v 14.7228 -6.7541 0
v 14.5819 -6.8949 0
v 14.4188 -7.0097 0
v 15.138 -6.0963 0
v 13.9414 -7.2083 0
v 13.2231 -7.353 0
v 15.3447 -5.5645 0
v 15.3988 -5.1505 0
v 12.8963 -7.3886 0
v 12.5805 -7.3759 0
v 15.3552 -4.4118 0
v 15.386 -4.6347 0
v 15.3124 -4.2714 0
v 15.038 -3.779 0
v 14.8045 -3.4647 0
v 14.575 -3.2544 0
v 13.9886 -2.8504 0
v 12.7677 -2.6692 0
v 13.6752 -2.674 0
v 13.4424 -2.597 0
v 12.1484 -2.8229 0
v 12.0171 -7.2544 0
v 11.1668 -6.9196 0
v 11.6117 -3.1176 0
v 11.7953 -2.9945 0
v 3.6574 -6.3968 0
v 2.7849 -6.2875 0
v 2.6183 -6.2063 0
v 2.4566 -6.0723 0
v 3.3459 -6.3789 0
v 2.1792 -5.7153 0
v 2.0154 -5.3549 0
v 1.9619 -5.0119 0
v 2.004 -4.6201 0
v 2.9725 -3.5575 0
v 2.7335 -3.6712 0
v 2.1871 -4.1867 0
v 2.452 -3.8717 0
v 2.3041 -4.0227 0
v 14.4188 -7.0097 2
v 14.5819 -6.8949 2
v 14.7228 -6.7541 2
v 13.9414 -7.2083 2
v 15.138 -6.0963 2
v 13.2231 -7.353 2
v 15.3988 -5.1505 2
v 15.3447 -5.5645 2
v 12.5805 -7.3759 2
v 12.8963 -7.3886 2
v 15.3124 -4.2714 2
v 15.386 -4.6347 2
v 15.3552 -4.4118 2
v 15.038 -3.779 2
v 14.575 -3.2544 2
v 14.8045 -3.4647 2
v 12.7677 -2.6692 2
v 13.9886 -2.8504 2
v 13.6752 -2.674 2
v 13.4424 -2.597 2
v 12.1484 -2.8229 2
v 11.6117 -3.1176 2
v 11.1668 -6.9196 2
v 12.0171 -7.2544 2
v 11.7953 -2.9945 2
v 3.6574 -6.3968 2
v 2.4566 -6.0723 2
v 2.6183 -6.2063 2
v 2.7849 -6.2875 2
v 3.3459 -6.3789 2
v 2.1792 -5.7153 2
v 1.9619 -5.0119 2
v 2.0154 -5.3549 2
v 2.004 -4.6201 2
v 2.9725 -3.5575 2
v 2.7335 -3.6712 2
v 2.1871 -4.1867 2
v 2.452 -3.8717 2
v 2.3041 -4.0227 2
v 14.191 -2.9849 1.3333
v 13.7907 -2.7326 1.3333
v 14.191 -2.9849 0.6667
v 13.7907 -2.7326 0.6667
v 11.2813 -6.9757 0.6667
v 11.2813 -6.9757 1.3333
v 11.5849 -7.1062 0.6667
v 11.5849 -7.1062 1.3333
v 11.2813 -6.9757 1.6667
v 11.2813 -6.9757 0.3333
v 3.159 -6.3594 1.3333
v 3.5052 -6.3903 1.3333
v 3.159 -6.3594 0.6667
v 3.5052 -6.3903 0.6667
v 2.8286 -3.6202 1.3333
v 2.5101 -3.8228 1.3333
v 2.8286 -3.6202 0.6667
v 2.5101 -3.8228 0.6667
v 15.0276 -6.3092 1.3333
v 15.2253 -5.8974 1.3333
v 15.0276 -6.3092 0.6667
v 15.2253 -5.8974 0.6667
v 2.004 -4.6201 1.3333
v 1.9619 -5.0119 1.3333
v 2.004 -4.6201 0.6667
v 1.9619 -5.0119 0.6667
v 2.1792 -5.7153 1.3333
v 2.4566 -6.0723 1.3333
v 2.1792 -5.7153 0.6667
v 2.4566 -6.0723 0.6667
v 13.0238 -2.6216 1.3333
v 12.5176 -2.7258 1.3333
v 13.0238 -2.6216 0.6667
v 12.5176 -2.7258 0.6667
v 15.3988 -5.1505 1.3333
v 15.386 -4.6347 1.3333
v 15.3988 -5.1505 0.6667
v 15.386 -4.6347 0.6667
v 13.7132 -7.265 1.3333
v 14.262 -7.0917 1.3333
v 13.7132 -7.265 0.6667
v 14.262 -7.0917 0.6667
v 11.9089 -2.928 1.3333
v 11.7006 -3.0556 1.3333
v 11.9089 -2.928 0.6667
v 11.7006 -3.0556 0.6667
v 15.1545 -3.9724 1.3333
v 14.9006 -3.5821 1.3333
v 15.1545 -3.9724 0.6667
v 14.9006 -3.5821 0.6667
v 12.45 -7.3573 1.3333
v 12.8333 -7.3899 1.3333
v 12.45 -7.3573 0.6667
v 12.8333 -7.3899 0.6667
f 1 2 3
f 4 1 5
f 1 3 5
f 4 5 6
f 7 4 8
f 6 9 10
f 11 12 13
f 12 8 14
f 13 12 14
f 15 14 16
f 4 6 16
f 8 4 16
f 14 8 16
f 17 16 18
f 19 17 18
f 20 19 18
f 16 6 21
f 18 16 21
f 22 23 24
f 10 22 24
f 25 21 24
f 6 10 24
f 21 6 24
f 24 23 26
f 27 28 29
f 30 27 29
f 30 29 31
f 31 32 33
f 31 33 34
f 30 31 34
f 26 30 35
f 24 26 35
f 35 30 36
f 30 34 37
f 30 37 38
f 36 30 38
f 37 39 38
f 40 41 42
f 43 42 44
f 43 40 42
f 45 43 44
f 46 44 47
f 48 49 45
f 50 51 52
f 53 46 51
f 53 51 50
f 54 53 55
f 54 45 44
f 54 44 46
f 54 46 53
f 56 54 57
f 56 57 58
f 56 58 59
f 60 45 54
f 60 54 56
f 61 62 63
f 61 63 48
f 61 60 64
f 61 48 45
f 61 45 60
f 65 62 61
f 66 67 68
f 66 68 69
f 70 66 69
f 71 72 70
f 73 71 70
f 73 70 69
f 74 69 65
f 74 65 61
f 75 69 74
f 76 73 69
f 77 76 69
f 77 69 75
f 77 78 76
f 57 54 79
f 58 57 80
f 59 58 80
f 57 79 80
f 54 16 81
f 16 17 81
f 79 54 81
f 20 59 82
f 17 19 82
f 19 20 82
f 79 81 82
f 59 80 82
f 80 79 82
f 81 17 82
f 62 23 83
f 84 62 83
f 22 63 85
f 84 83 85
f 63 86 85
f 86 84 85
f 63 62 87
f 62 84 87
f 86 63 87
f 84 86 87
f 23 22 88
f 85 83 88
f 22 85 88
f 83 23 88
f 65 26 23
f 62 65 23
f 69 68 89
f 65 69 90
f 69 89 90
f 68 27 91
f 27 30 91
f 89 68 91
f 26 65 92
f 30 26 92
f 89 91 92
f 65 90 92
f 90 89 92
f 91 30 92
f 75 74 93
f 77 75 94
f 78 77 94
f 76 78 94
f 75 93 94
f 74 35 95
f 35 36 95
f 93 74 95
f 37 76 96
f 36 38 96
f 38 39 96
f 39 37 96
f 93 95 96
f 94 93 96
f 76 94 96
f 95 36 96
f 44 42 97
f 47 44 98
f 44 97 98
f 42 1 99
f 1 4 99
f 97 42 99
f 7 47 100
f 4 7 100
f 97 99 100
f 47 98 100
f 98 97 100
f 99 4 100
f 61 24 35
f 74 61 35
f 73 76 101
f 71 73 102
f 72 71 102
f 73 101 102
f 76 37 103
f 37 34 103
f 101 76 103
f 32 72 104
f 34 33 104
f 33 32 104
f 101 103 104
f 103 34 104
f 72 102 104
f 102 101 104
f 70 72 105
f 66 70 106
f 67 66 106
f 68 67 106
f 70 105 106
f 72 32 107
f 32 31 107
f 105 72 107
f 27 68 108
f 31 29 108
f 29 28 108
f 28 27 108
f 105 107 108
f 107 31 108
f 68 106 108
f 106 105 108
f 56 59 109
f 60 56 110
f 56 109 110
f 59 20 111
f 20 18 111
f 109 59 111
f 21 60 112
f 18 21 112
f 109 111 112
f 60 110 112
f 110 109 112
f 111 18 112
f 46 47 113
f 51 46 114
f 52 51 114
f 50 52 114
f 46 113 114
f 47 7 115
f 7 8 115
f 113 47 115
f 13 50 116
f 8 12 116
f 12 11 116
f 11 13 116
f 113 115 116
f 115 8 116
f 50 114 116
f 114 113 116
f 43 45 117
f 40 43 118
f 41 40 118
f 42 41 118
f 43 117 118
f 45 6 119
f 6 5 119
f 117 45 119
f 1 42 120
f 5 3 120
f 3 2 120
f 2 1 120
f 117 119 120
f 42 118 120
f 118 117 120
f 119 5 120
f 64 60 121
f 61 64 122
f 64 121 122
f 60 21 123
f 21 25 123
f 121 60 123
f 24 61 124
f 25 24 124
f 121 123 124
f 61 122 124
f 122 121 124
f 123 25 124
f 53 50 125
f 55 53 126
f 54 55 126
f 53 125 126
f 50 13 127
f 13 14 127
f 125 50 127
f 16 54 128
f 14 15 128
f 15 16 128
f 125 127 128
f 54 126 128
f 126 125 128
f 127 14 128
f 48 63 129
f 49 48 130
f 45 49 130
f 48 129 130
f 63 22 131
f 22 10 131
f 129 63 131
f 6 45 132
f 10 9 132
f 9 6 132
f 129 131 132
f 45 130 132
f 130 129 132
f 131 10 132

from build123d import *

# Parameters (mm, degrees)
EXTRUDE_DEPTH = 2


with BuildPart() as part:
    # path2399 → Extrude (new body)
    with BuildSketch(Plane(origin=(8.682374, -4.98127, 0), x_dir=(0, 1, 0), z_dir=(0, 0, 1))):
        with BuildLine():
            add(Edge.make_bspline(
                [(-1.415579, 5.024931), (-1.938341, -2.484397)],
                knots=[0, 0, 7.527502, 7.527502], degree=1))
            add(Edge.make_bspline(
                [(-1.938341, -2.484397), (-1.938341, -2.484397), (-2.134903, -2.858259), (-2.273136, -3.334737)],
                knots=[0, 0, 0, 0, 1, 1, 1, 1], degree=3))
            add(Edge.make_bspline(
                [(-2.273136, -3.334737), (-2.411369, -3.811216), (-2.443203, -4.128926), (-2.371685, -4.540758)],
                knots=[0, 0, 0, 0, 1, 1, 1, 1], degree=3))
            add(Edge.make_bspline(
                [(-2.371685, -4.540758), (-2.300167, -4.952591), (-2.218933, -5.672599), (-1.772797, -6.040394)],
                knots=[0, 0, 0, 0, 1, 1, 1, 1], degree=3))
            add(Edge.make_bspline(
                [(-1.772797, -6.040394), (-1.326661, -6.40819), (-0.861351, -6.572675), (-0.583202, -6.662312)],
                knots=[0, 0, 0, 0, 1, 1, 1, 1], degree=3))
            add(Edge.make_bspline(
                [(-0.583202, -6.662312), (-0.305053, -6.751952), (0.507781, -6.731952), (0.709843, -6.630052)],
                knots=[0, 0, 0, 0, 1, 1, 1, 1], degree=3))
            add(Edge.make_bspline(
                [(0.709843, -6.630052), (0.911905, -6.52815), (1.481843, -6.245909), (1.726833, -5.892641)],
                knots=[0, 0, 0, 0, 1, 1, 1, 1], degree=3))
            add(Edge.make_bspline(
                [(1.726833, -5.892641), (1.971823, -5.539373), (2.340182, -5.059724), (2.384256, -4.759981)],
                knots=[0, 0, 0, 0, 1, 1, 1, 1], degree=3))
            add(Edge.make_bspline(
                [(2.384256, -4.759981), (2.42833, -4.460237), (2.223091, -3.691858), (2.158411, -3.465999)],
                knots=[0, 0, 0, 0, 1, 1, 1, 1], degree=3))
            add(Edge.make_bspline(
                [(2.158411, -3.465999), (2.093732, -3.240141), (1.863634, -2.929328), (1.863634, -2.929328)],
                knots=[0, 0, 0, 0, 1, 1, 1, 1], degree=3))
            add(Edge.make_bspline(
                [(1.863634, -2.929328), (1.423808, 5.709855)],
                knots=[0, 0, 8.650371, 8.650371], degree=1))
            add(Edge.make_bspline(
                [(1.423808, 5.709855), (1.423808, 5.709855), (1.246198, 6.226563), (0.794563, 6.495307)],
                knots=[0, 0, 0, 0, 1, 1, 1, 1], degree=3))
            add(Edge.make_bspline(
                [(0.794563, 6.495307), (0.342929, 6.764051), (-0.057622, 6.753041), (-0.37358, 6.666974)],
                knots=[0, 0, 0, 0, 1, 1, 1, 1], degree=3))
            add(Edge.make_bspline(
                [(-0.37358, 6.666974), (-0.689538, 6.580907), (-1.208145, 6.230265), (-1.306201, 5.897514)],
                knots=[0, 0, 0, 0, 1, 1, 1, 1], degree=3))
            add(Edge.make_bspline(
                [(-1.306201, 5.897514), (-1.404257, 5.564763), (-1.415579, 5.024931), (-1.415579, 5.024931)],
                knots=[0, 0, 0, 0, 1, 1, 1, 1], degree=3))
        make_face()
    extrude(amount=EXTRUDE_DEPTH)


solid = part.part
